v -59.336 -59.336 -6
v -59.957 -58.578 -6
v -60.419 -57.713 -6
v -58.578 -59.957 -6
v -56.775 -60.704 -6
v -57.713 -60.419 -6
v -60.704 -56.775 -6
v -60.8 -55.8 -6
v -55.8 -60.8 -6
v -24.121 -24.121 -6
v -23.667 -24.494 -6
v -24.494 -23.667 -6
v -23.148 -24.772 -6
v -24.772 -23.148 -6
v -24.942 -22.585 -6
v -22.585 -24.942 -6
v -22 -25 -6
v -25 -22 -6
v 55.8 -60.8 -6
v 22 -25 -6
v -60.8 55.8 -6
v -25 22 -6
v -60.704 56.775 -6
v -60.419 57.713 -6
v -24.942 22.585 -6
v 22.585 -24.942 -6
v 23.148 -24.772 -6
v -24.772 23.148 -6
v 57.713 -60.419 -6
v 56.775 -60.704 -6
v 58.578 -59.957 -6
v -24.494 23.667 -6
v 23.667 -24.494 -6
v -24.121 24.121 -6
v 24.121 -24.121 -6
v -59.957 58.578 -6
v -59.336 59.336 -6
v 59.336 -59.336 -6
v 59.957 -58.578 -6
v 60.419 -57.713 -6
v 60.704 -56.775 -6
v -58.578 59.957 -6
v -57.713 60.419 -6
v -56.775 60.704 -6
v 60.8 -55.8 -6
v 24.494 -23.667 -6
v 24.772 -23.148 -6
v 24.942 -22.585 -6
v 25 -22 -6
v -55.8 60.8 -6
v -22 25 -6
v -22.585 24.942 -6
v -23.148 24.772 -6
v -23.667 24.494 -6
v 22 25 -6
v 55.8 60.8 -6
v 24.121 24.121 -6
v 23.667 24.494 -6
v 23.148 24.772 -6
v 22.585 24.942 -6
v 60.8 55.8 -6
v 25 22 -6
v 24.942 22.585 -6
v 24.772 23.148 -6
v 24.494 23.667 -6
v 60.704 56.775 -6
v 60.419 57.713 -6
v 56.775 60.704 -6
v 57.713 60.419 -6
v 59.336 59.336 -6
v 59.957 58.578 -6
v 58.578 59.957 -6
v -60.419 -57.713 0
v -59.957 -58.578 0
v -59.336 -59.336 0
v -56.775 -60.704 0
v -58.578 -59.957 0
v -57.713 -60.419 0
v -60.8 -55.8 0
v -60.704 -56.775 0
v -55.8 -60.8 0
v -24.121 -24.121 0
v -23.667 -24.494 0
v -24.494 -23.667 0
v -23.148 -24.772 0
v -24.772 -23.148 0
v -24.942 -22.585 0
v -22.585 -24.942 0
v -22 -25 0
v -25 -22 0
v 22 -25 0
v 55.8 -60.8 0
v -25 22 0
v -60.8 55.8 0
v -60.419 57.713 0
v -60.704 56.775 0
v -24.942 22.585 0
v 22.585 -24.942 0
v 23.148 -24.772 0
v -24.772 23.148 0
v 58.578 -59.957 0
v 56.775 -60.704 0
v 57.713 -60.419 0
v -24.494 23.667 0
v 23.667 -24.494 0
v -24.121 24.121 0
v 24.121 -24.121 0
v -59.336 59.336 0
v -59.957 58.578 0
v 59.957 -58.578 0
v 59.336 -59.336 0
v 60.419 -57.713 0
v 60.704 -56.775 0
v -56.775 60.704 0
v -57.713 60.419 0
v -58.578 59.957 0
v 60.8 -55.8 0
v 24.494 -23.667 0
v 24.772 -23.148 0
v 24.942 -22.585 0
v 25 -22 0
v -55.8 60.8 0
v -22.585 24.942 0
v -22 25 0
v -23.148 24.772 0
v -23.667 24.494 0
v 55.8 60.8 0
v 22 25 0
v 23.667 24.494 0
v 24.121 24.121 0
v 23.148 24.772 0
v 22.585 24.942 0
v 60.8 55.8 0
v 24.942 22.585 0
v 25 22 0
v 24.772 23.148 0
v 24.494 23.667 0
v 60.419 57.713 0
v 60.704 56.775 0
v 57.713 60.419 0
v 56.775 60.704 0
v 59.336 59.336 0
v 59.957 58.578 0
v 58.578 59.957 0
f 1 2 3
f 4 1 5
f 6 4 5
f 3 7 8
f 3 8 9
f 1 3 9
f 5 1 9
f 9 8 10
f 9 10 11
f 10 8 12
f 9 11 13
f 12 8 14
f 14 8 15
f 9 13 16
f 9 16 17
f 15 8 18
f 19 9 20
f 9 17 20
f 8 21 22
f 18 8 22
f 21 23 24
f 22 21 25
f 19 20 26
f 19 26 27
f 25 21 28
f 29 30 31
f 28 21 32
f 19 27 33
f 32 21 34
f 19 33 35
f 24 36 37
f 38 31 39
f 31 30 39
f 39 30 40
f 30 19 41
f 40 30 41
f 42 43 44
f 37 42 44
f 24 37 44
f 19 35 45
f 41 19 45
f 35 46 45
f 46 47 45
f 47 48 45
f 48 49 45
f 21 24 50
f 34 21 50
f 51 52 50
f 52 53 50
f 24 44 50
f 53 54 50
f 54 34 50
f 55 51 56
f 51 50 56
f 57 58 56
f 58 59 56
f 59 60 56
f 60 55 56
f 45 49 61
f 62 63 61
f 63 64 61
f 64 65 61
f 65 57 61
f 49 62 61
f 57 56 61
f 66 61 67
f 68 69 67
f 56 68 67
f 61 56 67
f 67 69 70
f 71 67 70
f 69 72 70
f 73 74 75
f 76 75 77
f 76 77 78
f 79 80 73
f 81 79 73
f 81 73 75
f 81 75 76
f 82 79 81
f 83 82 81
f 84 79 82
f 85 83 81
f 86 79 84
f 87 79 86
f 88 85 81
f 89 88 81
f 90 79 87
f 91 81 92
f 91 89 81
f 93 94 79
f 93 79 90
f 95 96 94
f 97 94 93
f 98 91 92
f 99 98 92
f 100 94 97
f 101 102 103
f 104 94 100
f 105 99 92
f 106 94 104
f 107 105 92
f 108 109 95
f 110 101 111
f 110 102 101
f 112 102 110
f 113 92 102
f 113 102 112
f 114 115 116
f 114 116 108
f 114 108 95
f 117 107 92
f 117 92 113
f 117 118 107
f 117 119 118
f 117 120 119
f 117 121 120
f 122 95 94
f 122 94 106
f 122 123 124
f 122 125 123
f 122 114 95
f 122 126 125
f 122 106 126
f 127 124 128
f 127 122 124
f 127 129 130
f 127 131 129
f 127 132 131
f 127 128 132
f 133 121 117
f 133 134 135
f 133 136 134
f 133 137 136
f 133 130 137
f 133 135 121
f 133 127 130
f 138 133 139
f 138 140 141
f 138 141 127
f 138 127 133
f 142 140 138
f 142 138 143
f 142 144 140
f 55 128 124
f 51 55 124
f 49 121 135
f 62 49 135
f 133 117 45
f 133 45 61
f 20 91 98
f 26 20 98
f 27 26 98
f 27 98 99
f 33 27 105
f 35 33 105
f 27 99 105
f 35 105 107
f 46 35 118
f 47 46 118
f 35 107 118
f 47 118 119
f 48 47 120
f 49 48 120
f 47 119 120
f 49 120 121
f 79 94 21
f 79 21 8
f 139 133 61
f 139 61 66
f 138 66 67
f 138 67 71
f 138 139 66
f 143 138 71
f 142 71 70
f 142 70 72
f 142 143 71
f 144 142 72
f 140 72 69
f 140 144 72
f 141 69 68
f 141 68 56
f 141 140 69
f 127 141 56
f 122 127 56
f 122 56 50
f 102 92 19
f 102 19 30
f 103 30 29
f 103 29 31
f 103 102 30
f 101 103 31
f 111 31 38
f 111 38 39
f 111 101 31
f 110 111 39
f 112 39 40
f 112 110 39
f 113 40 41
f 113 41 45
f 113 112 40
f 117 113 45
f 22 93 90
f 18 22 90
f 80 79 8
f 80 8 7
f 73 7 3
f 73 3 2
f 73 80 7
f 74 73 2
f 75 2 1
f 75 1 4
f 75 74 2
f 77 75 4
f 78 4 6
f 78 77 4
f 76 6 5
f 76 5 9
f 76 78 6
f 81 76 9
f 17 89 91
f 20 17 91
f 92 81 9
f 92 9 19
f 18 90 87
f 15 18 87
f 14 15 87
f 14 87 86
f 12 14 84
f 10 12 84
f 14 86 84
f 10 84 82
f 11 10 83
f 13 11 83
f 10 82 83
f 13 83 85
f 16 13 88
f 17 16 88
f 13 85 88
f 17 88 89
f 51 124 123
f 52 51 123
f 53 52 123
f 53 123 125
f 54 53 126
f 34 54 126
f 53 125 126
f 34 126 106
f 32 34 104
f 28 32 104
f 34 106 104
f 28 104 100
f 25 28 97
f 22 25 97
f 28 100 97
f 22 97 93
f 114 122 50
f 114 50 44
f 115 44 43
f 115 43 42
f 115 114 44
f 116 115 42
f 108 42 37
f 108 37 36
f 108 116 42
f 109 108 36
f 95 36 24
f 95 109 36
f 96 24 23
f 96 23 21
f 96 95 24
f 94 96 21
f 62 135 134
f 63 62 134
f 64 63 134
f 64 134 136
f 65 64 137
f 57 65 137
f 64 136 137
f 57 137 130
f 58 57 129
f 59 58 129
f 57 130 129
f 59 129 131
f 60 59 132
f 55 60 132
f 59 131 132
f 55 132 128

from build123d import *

# Parameters (mm, degrees)
F1_DEPTH = 6
F3_DEPTH = 10


with BuildPart() as f1:
    # F0 (on Top) → F1 (new body)
    with BuildSketch(Plane.XY):
        with BuildLine():
            Line((-55.8, -60.8), (55.8, -60.8))
            ThreePointArc((55.8, -60.8), (59.335534, -59.335534), (60.8, -55.8))
            Line((60.8, -55.8), (60.8, 55.8))
            ThreePointArc((60.8, 55.8), (59.335534, 59.335534), (55.8, 60.8))
            Line((55.8, 60.8), (-55.8, 60.8))
            ThreePointArc((-55.8, 60.8), (-59.335534, 59.335534), (-60.8, 55.8))
            Line((-60.8, 55.8), (-60.8, -55.8))
            ThreePointArc((-60.8, -55.8), (-59.335534, -59.335534), (-55.8, -60.8))
        make_face()
    extrude(amount=-F1_DEPTH)

    # F2 (on face) → F3 (cut)
    with BuildSketch(Plane.XY):
        with BuildLine():
            Line((-22, -25), (22, -25))
            ThreePointArc((22, -25), (24.12132, -24.12132), (25, -22))
            Line((25, -22), (25, 22))
            ThreePointArc((25, 22), (24.12132, 24.12132), (22, 25))
            Line((22, 25), (-22, 25))
            ThreePointArc((-22, 25), (-24.12132, 24.12132), (-25, 22))
            Line((-25, 22), (-25, -22))
            ThreePointArc((-25, -22), (-24.12132, -24.12132), (-22, -25))
        make_face()
    extrude(amount=-F3_DEPTH, mode=Mode.SUBTRACT)


solid = f1.part
